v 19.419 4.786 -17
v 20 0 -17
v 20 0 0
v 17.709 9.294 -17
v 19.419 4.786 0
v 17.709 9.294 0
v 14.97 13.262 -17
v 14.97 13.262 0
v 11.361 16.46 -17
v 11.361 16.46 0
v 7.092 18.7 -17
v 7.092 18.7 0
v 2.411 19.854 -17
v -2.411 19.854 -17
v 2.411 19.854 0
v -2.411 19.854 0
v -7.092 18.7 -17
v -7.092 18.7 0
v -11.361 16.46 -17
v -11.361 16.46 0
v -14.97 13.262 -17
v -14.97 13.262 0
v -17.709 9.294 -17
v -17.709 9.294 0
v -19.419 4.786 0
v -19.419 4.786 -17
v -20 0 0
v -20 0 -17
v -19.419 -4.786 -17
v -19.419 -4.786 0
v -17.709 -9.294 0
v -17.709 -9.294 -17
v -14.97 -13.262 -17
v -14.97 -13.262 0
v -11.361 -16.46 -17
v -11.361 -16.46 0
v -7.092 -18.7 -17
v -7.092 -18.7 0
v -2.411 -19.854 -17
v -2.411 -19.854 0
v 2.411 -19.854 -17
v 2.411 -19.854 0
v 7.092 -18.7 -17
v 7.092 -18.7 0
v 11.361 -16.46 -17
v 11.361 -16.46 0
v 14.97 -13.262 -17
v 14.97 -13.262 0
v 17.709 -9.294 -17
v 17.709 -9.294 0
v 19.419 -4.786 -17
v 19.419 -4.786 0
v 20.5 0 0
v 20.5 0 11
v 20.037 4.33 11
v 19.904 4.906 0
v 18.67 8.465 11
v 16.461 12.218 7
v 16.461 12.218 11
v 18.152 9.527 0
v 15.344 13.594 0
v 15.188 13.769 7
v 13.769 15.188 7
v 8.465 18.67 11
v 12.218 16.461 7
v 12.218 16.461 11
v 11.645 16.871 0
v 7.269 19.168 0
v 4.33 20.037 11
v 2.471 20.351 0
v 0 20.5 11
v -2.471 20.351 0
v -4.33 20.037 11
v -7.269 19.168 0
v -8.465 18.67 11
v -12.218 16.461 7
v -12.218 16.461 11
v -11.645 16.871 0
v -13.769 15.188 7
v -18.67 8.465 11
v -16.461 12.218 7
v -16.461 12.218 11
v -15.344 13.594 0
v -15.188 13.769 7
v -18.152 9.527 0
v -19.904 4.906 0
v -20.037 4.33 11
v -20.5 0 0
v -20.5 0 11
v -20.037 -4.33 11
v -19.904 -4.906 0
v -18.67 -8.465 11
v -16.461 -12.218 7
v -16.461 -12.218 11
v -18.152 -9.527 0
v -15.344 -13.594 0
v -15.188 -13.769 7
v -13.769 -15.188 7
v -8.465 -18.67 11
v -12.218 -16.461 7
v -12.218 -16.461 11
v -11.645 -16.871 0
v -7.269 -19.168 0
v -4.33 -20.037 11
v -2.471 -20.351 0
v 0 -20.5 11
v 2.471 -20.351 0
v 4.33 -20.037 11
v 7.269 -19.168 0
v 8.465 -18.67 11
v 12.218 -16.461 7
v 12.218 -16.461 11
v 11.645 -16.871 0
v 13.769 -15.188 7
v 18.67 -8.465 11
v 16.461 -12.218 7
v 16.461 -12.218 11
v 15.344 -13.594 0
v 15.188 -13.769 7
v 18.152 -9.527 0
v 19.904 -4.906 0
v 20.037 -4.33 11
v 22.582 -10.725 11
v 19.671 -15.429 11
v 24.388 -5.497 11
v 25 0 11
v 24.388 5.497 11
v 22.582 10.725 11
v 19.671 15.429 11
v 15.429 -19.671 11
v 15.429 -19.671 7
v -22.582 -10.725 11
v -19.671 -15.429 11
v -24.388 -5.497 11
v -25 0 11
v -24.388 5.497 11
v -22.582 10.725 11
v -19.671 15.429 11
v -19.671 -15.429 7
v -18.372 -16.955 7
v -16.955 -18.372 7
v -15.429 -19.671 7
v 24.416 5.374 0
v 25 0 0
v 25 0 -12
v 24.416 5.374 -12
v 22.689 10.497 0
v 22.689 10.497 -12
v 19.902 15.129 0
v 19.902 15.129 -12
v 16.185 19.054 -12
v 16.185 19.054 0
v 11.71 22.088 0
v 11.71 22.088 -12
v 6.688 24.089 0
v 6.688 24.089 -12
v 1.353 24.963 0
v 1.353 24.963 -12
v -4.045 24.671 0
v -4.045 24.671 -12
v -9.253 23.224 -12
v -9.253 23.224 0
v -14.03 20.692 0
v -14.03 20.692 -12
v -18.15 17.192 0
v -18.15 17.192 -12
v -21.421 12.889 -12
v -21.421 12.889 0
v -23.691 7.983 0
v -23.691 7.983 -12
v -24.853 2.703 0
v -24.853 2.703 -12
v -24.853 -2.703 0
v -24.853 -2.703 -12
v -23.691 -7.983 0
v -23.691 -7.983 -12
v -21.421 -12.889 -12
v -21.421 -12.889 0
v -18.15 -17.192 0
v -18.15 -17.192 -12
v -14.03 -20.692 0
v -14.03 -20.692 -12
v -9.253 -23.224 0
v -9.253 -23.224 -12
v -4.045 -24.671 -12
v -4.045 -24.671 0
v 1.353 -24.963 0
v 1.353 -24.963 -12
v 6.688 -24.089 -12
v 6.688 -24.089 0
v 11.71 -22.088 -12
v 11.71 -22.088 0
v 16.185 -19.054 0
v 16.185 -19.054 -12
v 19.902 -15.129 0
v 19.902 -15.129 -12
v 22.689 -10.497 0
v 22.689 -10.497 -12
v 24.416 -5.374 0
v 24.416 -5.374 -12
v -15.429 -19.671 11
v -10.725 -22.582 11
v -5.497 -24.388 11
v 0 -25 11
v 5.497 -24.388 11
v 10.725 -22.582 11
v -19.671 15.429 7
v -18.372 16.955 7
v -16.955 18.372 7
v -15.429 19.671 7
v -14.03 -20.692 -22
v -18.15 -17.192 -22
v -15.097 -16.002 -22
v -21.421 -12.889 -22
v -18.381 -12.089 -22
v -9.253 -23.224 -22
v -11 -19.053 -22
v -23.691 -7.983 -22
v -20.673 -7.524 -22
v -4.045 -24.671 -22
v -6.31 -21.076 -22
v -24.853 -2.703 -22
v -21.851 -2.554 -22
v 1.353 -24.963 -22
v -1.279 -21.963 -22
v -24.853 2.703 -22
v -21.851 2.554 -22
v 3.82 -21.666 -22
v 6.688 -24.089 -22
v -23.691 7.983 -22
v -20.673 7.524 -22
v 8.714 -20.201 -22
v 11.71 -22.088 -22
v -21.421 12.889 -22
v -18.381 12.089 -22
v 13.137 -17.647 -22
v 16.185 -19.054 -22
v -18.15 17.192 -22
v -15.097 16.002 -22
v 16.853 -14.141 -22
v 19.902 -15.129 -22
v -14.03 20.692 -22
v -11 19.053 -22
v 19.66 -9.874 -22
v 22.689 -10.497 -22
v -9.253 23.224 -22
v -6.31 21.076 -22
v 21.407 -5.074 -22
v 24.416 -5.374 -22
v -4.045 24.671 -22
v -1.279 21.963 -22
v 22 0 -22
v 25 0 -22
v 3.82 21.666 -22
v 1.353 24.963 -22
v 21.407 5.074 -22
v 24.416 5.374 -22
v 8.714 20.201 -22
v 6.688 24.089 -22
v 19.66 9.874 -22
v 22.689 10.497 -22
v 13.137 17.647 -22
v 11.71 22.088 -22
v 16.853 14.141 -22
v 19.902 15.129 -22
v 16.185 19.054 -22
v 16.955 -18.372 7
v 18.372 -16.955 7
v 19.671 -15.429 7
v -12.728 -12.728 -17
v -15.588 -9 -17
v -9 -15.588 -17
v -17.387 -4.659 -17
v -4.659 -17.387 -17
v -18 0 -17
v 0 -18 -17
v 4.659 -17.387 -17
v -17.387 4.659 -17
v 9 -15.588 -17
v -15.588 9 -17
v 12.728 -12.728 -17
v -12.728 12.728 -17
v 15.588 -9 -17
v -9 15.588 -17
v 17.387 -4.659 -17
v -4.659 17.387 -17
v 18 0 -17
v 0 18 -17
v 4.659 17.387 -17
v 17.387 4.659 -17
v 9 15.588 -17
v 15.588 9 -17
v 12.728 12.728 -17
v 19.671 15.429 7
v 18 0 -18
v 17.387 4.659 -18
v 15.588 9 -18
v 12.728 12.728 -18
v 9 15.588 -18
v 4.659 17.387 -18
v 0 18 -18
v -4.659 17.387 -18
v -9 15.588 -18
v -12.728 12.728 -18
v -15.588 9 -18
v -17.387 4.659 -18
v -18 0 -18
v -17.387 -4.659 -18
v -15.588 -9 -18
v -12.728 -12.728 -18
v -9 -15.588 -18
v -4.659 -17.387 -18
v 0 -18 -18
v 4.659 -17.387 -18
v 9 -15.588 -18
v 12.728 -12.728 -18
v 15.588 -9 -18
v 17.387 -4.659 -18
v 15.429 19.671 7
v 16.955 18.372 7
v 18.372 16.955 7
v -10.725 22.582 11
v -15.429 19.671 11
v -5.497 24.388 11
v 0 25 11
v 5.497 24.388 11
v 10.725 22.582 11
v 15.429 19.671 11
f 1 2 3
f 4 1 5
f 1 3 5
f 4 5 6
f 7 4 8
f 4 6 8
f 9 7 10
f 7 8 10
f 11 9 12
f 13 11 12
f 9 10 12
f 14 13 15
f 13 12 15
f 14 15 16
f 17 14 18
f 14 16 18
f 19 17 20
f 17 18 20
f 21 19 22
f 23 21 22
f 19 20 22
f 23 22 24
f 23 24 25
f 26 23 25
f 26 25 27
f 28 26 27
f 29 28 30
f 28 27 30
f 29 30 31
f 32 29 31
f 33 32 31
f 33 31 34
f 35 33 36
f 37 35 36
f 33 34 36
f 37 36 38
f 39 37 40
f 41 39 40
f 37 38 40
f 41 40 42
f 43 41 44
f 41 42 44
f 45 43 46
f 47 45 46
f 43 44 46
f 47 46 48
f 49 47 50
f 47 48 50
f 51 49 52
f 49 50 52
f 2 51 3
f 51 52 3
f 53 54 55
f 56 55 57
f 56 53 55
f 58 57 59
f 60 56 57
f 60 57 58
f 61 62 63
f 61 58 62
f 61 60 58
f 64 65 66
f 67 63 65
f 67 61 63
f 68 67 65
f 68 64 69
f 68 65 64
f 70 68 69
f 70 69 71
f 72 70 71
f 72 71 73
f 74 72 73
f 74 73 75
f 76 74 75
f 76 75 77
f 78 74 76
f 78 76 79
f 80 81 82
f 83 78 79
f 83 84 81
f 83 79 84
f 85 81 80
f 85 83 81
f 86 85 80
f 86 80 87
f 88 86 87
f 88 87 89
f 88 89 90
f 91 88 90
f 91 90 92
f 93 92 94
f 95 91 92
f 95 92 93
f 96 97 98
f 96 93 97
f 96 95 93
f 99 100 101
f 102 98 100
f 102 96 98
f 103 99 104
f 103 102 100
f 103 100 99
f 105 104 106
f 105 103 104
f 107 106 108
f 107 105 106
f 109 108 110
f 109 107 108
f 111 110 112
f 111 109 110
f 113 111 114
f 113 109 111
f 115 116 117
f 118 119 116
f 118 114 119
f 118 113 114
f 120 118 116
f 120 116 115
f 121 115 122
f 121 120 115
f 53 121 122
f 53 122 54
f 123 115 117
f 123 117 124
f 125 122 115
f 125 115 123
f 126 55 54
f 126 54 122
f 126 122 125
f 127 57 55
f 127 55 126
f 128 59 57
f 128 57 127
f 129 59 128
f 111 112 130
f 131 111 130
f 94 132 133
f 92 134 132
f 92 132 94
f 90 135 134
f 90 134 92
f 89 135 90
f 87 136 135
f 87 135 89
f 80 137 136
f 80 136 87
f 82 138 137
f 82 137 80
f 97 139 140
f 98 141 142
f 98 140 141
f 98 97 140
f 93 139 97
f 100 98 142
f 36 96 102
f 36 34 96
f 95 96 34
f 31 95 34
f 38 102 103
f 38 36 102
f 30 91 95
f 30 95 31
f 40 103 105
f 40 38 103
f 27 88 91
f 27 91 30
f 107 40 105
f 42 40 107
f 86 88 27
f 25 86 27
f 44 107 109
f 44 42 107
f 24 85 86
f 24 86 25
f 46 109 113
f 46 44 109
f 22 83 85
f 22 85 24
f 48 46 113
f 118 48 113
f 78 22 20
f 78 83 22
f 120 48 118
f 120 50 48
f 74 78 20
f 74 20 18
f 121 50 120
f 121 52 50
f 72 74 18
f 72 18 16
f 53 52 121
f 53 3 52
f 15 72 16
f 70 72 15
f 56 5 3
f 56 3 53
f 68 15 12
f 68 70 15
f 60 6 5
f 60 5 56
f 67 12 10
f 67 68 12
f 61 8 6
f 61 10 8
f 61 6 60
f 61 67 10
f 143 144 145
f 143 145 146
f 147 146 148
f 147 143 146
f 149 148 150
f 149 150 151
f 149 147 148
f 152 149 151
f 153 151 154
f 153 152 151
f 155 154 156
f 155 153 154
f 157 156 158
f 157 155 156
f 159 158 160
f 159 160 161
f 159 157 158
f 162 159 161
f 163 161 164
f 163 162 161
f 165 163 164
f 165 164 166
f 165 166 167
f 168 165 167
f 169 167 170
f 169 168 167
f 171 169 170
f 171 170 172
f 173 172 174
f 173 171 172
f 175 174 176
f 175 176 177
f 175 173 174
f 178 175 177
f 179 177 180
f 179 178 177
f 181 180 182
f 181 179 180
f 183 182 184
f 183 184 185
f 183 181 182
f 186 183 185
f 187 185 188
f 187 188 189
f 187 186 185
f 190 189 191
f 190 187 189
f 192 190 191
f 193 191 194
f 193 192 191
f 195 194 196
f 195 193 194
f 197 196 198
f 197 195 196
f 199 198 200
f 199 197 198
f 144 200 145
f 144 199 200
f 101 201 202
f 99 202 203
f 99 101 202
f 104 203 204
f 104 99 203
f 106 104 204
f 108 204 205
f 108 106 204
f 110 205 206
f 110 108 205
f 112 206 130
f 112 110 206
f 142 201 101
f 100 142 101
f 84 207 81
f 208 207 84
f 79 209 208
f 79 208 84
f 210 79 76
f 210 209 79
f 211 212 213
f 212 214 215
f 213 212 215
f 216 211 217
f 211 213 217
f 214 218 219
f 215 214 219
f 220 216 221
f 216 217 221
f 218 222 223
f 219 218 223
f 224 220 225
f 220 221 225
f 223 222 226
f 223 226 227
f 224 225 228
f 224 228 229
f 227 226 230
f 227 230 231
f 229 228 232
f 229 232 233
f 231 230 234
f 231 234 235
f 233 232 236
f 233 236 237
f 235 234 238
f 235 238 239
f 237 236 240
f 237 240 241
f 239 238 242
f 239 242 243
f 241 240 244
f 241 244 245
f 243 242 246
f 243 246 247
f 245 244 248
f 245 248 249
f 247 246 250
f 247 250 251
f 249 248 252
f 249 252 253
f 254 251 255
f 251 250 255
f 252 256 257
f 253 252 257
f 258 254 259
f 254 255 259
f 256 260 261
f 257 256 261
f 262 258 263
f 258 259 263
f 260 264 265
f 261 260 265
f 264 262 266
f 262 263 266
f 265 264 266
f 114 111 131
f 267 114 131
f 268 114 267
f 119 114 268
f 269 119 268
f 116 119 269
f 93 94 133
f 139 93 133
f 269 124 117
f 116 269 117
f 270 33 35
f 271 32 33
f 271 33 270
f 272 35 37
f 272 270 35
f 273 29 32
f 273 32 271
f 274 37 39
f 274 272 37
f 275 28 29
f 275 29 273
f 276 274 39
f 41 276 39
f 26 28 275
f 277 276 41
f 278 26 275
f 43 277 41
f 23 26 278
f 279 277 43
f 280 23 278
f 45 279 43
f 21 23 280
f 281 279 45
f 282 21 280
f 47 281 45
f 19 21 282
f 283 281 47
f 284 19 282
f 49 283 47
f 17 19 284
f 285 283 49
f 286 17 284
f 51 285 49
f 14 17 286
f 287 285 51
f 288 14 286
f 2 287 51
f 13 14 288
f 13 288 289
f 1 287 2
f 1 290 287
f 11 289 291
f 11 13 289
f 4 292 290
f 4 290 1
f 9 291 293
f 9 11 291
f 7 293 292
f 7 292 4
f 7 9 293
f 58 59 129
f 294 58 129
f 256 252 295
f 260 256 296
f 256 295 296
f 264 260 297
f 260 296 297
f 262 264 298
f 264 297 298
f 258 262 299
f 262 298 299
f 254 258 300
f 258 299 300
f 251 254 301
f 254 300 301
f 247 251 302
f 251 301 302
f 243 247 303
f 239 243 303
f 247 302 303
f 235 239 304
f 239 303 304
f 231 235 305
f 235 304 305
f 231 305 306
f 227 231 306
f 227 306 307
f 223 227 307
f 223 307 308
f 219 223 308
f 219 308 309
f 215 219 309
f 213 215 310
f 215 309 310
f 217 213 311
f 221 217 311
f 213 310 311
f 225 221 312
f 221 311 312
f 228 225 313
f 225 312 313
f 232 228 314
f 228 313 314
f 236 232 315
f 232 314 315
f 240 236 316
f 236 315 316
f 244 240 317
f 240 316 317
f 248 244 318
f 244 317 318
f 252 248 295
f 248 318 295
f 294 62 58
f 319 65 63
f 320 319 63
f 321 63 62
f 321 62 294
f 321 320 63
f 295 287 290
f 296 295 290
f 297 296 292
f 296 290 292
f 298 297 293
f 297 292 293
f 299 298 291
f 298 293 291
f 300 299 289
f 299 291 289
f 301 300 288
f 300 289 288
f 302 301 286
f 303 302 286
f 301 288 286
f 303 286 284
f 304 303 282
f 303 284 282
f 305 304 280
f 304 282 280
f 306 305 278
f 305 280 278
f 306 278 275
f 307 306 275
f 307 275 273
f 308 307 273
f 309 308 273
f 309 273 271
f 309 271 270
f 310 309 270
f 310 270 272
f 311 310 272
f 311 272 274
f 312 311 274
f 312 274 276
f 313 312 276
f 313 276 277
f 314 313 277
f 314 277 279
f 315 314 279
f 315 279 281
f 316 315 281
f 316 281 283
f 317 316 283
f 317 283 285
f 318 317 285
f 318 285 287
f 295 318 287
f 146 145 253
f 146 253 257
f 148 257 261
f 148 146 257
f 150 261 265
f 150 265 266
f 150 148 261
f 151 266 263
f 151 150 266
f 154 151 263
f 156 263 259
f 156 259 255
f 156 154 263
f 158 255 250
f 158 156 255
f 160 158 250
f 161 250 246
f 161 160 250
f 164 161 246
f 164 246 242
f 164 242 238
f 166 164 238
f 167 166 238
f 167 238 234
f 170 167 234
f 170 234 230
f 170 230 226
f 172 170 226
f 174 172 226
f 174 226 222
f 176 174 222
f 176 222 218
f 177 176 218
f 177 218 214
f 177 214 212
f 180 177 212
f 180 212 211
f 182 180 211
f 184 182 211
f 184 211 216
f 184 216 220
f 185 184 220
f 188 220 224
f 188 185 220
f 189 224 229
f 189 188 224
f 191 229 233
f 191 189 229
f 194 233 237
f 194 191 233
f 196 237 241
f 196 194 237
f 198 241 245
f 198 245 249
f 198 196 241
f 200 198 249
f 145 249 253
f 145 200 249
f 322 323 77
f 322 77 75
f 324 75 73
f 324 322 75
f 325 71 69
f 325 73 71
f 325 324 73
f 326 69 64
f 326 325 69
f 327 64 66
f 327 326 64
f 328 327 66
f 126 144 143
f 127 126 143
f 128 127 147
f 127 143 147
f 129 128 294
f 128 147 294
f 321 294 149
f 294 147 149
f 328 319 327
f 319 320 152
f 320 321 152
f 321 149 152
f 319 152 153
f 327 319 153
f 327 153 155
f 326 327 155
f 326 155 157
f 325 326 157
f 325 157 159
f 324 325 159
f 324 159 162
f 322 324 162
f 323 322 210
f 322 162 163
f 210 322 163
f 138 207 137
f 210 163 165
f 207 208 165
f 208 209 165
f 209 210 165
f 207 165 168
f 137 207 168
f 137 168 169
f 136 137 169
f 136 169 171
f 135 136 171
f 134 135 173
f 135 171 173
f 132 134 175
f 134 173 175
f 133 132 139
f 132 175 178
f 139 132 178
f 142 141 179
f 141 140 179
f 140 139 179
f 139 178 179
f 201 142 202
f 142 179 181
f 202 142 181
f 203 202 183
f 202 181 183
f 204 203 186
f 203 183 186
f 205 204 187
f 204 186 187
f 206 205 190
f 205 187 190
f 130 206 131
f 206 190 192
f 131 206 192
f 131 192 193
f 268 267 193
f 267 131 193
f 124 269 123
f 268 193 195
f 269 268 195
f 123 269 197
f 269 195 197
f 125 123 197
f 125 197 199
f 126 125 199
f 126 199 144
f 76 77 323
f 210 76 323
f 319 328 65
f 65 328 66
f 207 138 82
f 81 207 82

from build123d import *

# Parameters (mm, degrees)
F0_R      = 27
F0_R_2    = 18
F1_DEPTH  = 22
F2_R      = 20
F3_DEPTH  = 17
F4_SIZE   = 4
F5_R      = 27
F5_R_2    = 25
F6_DEPTH  = 12
F7_R      = 25
F7_R_2    = 20.5
F8_DEPTH  = 11
F10_DEPTH = 4
F11_R     = 27
F11_R_2   = 25
F12_DEPTH = 10.001


with BuildPart() as f1:
    # F0 (on Top) → F1 (new body)
    with BuildSketch(Plane.XY):
        Circle(F0_R)
        Circle(F0_R_2, mode=Mode.SUBTRACT)
    extrude(amount=-F1_DEPTH)

    # F2 (on face) → F3 (cut)
    with BuildSketch(Plane.XY):
        Circle(F2_R)
    extrude(amount=-F3_DEPTH, mode=Mode.SUBTRACT)

    # F4
    f4_edges = [f1.edges().sort_by_distance(p)[0] for p in [
        (-18, 0, -22),
    ]]
    chamfer(f4_edges, length=F4_SIZE)

    # F5 (on Top) → F6 (cut)
    with BuildSketch(Plane.XY):
        Circle(F5_R)
        Circle(F5_R_2, mode=Mode.SUBTRACT)
    extrude(amount=-F6_DEPTH, mode=Mode.SUBTRACT)

    # F7 (on face) → F8 (join)
    with BuildSketch(Plane.XY):
        Circle(F7_R)
        Circle(F7_R_2, mode=Mode.SUBTRACT)
    extrude(amount=F8_DEPTH)

    # F9 (on face) → F10 (cut)
    with BuildSketch(Plane.XY.offset(11)):
        Polygon((-28.467241, 32.709882), (-32.709882, 28.467241), (-4.242641, 0), (0, 4.242641), align=None)
        Polygon((0, -4.242641), (-4.242641, 0), (-34.573084, -30.330443), (-30.330443, -34.573084), align=None)
        Polygon((4.242641, 0), (0, -4.242641), (30.929728, -35.172369), (35.172369, -30.929728), align=None)
        Polygon((29.066526, 33.309167), (0, 4.242641), (4.242641, 0), (33.309167, 29.066526), align=None)
    extrude(amount=-F10_DEPTH, mode=Mode.SUBTRACT)

    # F11 (on face) → F12 (cut, through all)
    with BuildSketch(Plane.XY.offset(-12)):
        Circle(F11_R)
        Circle(F11_R_2, mode=Mode.SUBTRACT)
    extrude(amount=-F12_DEPTH, mode=Mode.SUBTRACT)


solid = f1.part
